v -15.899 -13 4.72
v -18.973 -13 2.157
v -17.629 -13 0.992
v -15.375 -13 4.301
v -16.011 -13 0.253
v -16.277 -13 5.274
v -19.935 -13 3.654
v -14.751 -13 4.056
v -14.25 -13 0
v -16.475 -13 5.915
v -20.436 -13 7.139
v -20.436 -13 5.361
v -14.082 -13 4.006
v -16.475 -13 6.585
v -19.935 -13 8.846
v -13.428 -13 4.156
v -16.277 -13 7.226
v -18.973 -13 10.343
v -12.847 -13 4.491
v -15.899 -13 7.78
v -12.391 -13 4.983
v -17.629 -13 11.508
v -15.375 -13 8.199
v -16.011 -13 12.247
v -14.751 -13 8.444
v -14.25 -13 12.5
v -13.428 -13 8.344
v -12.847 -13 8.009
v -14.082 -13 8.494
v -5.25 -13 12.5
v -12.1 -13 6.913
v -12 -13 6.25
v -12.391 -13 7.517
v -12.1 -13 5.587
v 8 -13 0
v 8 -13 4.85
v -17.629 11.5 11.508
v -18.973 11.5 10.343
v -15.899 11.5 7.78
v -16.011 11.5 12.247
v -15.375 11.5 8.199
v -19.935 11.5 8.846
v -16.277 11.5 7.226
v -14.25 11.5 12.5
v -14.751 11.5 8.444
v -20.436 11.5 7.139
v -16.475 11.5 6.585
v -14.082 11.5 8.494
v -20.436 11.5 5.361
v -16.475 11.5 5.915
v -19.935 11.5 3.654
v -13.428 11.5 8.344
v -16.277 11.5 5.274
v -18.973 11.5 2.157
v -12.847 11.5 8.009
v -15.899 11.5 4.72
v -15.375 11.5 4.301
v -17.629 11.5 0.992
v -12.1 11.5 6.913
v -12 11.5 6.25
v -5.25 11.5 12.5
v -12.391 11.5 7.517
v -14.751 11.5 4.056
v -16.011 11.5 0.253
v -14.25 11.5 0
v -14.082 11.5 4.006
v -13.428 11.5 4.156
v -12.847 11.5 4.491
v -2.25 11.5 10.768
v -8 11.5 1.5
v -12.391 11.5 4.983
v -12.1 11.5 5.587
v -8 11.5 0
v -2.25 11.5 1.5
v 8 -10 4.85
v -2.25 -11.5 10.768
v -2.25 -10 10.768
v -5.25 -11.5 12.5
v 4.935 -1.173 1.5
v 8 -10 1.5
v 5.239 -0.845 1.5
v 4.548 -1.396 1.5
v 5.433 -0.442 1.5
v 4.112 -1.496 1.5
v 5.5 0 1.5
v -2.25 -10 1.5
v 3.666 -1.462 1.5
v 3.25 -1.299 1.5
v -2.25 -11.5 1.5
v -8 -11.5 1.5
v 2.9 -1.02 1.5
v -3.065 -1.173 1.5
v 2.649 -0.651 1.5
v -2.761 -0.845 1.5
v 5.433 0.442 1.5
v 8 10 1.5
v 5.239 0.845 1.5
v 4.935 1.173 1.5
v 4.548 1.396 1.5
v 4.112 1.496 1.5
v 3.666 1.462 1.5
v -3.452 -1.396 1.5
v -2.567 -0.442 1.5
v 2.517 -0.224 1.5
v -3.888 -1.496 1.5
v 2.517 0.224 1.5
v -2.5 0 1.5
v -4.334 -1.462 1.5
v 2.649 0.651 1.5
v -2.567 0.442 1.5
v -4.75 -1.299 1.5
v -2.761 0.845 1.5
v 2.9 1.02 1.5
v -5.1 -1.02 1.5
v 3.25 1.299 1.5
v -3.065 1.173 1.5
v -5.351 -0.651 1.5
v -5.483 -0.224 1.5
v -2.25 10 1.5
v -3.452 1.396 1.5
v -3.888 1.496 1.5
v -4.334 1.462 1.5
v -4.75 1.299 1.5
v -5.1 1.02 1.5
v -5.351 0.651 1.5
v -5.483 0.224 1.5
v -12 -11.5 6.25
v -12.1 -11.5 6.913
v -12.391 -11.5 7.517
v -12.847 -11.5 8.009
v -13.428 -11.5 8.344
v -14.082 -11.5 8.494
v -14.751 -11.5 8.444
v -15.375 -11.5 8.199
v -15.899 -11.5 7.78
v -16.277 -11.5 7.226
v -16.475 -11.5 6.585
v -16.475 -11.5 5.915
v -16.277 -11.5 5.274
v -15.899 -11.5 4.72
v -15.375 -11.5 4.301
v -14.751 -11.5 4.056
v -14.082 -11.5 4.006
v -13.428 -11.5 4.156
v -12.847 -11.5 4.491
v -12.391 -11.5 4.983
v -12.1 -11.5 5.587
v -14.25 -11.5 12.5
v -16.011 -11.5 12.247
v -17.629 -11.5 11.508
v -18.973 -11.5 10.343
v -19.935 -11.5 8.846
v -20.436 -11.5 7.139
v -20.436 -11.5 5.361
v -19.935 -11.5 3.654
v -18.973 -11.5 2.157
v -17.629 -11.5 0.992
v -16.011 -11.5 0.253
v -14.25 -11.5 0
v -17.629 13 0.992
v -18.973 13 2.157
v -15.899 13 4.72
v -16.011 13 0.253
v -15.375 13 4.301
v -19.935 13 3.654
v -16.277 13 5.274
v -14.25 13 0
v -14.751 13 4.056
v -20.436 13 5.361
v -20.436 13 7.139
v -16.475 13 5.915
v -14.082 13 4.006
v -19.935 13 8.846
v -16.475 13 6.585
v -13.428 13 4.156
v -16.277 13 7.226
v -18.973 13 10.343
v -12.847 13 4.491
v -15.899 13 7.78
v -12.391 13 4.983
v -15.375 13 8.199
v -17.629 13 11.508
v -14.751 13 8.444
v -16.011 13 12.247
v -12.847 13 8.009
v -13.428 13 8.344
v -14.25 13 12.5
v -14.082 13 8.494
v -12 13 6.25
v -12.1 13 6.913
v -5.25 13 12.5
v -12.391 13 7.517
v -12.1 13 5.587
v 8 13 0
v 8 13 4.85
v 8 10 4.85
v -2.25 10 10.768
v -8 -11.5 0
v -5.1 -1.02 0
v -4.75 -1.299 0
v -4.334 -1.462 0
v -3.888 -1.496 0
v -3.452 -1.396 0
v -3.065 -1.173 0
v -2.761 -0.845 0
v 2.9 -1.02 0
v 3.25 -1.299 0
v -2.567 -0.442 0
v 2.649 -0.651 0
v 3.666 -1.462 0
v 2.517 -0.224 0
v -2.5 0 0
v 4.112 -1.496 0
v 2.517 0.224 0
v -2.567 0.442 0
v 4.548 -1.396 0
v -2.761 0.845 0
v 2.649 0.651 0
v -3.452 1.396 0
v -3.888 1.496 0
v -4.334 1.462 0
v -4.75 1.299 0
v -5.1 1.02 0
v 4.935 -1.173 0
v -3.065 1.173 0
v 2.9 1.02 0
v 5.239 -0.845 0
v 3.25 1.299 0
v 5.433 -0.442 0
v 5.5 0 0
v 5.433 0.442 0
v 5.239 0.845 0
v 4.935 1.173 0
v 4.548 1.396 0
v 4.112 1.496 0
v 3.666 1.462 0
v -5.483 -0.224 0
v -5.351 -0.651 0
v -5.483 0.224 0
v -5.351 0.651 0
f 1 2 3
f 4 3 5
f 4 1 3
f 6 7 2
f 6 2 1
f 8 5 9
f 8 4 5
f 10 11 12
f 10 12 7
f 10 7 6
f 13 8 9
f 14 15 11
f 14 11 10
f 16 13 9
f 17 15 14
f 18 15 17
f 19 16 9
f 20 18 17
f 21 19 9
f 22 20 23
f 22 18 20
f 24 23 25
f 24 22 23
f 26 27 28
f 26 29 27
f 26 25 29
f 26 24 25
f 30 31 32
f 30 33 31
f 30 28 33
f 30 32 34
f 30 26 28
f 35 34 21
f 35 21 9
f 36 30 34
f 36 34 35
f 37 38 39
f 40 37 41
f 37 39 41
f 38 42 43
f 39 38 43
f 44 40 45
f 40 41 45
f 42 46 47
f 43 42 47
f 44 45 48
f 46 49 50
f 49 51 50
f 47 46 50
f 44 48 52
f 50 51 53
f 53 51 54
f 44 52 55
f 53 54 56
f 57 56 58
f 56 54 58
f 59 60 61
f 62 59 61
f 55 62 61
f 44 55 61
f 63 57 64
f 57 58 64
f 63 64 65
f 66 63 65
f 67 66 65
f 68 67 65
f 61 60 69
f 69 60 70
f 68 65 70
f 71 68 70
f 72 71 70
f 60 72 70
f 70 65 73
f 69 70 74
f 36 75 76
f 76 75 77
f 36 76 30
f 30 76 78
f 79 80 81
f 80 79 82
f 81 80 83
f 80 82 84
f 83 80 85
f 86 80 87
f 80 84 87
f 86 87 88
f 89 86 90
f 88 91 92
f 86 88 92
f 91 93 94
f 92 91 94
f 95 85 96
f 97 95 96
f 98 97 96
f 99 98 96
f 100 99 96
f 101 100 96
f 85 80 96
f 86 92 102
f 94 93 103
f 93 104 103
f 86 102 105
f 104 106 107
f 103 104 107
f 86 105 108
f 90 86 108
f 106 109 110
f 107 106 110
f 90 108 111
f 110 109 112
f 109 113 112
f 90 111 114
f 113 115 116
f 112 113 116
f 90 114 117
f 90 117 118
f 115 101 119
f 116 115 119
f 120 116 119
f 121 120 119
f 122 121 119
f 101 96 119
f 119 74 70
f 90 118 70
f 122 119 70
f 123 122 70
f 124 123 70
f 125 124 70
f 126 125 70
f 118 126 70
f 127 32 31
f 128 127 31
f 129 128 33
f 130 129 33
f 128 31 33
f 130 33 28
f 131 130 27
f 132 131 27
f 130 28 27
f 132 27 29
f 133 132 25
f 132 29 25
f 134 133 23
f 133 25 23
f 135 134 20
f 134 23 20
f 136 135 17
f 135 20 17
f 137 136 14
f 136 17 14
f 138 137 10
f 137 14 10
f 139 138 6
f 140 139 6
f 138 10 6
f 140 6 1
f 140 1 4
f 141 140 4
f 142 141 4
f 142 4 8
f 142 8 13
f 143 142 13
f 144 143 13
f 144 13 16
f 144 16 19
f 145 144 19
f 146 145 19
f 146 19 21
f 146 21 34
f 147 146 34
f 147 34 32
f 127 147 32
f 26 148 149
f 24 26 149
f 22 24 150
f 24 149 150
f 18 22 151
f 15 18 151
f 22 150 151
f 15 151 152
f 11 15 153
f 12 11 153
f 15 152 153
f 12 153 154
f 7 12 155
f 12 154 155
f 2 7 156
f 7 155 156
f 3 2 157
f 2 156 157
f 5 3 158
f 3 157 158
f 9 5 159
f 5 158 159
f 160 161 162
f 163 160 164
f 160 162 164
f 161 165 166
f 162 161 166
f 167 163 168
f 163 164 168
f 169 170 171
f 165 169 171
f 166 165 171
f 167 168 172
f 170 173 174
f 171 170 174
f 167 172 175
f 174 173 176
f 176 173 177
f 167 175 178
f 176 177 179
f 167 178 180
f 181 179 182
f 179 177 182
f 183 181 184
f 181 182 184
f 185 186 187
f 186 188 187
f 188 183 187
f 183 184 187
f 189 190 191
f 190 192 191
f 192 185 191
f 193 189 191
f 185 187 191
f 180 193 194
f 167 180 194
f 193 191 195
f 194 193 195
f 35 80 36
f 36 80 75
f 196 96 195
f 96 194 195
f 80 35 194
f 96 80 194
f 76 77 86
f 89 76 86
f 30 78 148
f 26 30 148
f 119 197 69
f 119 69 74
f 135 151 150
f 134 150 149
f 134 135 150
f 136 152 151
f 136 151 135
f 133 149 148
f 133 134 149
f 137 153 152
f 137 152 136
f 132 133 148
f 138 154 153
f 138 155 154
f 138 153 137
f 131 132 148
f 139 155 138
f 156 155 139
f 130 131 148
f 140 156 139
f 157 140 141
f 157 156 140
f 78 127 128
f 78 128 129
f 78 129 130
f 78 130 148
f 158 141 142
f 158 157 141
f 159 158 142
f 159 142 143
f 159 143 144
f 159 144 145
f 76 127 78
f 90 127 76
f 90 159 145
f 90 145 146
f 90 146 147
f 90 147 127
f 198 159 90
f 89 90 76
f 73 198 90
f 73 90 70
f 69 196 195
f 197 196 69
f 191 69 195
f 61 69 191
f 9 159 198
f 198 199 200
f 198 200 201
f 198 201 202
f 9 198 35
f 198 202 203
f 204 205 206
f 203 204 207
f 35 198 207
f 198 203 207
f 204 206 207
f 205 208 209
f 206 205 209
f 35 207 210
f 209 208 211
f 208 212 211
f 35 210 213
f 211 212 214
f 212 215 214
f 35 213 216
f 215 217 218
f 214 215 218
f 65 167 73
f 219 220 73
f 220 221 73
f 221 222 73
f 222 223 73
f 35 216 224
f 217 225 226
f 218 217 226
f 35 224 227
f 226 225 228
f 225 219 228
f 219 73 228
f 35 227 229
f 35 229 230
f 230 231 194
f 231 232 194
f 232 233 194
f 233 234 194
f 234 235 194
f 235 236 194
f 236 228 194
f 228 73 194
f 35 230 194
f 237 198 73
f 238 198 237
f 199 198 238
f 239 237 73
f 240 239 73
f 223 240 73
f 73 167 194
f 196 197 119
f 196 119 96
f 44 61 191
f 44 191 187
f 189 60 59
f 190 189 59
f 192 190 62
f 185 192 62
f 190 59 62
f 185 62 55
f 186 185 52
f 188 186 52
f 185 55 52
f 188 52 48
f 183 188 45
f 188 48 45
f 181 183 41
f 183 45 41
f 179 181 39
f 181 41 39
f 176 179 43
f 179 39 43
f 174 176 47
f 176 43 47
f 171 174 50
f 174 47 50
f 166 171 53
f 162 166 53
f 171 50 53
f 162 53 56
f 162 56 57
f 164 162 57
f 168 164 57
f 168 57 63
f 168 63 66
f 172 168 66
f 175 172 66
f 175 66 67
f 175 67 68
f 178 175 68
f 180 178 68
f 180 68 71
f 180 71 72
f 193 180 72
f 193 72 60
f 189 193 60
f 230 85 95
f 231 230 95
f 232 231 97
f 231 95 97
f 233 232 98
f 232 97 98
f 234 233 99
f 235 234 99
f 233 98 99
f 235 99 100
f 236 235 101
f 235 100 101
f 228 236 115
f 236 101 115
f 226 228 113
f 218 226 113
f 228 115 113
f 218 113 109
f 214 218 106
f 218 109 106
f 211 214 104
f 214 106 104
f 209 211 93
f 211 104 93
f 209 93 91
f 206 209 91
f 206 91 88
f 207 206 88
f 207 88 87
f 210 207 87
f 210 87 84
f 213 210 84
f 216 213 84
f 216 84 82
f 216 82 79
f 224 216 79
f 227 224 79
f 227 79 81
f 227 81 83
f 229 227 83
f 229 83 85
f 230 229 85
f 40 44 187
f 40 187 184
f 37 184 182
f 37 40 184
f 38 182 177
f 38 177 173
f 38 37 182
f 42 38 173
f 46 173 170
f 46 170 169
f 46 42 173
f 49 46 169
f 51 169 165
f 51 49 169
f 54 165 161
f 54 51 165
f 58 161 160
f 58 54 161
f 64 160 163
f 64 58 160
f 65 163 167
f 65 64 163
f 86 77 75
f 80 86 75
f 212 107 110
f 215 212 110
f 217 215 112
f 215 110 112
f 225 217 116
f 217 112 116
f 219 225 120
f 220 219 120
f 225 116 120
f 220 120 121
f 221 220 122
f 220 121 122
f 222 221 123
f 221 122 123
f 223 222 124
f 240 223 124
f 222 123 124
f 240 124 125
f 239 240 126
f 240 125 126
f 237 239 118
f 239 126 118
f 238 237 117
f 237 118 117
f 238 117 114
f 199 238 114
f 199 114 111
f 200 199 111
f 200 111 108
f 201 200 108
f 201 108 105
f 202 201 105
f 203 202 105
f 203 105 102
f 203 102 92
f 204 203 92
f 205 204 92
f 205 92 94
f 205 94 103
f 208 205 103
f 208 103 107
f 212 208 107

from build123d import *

# Parameters (mm, degrees)
SKETCH1_W                    = 16
SKETCH1_H                    = 20
BOSS_EXTRUDE1_DEPTH          = 1.5
BOSS_EXTRUDE2_DEPTH          = 3
CUT_EXTRUDE1_DEPTH           = 1.5
F_4_5_4_5_DIAMETER_HOLE1_D   = 4.5
F_3_0_3_DIAMETER_HOLE1_D     = 3
F_3_0_3_DIAMETER_HOLE1_DEPTH = 12.5


with BuildPart() as part:
    # Sketch1 → Boss-Extrude1 (new body)
    with BuildSketch(Plane(origin=(0, 0, 0), x_dir=(-1, 0, 0), z_dir=(0, 0, -1))):
        Rectangle(SKETCH1_W, SKETCH1_H)
    extrude(amount=-BOSS_EXTRUDE1_DEPTH)

    # Sketch2 → Boss-Extrude2 (add)
    with BuildSketch(Plane(origin=(0, 10, 0), x_dir=(-1, 0, 0), z_dir=(0, 1, 0))):
        with BuildLine():
            Line((14.25, 0), (-8, 0))
            Line((-8, 0), (-8, 4.850108933))
            Line((-8, 4.850108933), (5.25, 12.5))
            Line((5.25, 12.5), (14.25, 12.5))
            ThreePointArc((14.25, 12.5), (20.5, 6.25), (14.25, 0))
        make_face()
    boss_extrude2 = extrude(amount=BOSS_EXTRUDE2_DEPTH)

    # Mirror1: Boss-Extrude2 across plane
    add(boss_extrude2.mirror(Plane.ZX))

    # Sketch4 → Cut-Extrude1 (cut)
    with BuildSketch(Plane(origin=(0, 10, 0), x_dir=(1, 0, 0), z_dir=(0, 1, 0))):
        Polygon((-20.5, -12.5), (-2.25, -12.5), (-2.25, -1.5), (-8, -1.5), (-8, 0), (-20.5, 0), align=None)
    cut_extrude1 = extrude(amount=CUT_EXTRUDE1_DEPTH, mode=Mode.SUBTRACT)

    # Mirror2: Cut-Extrude1 across plane
    add(cut_extrude1.mirror(Plane.ZX), mode=Mode.SUBTRACT)

    # Ø4.5 (4.5) Diameter Hole1 (through all)
    with Locations(Plane(origin=(0, 13, 0), x_dir=(-1, 0, 0), z_dir=(0, 1, 0))):
        with Locations((14.25, 6.25)):
            f_4_5_4_5_diameter_hole1 = Hole(F_4_5_4_5_DIAMETER_HOLE1_D / 2)

    # Mirror3: Ø4.5 (4.5) Diameter Hole1 across plane
    add(f_4_5_4_5_diameter_hole1.mirror(Plane.ZX), mode=Mode.SUBTRACT)

    # Ø3.0 (3) Diameter Hole1
    with Locations(Plane(origin=(0, 0, 0), x_dir=(-1, 0, 0), z_dir=(0, 0, -1))):
        with Locations((-4, 0), (4, 0)):
            Hole(F_3_0_3_DIAMETER_HOLE1_D / 2, depth=F_3_0_3_DIAMETER_HOLE1_DEPTH)


solid = part.part
